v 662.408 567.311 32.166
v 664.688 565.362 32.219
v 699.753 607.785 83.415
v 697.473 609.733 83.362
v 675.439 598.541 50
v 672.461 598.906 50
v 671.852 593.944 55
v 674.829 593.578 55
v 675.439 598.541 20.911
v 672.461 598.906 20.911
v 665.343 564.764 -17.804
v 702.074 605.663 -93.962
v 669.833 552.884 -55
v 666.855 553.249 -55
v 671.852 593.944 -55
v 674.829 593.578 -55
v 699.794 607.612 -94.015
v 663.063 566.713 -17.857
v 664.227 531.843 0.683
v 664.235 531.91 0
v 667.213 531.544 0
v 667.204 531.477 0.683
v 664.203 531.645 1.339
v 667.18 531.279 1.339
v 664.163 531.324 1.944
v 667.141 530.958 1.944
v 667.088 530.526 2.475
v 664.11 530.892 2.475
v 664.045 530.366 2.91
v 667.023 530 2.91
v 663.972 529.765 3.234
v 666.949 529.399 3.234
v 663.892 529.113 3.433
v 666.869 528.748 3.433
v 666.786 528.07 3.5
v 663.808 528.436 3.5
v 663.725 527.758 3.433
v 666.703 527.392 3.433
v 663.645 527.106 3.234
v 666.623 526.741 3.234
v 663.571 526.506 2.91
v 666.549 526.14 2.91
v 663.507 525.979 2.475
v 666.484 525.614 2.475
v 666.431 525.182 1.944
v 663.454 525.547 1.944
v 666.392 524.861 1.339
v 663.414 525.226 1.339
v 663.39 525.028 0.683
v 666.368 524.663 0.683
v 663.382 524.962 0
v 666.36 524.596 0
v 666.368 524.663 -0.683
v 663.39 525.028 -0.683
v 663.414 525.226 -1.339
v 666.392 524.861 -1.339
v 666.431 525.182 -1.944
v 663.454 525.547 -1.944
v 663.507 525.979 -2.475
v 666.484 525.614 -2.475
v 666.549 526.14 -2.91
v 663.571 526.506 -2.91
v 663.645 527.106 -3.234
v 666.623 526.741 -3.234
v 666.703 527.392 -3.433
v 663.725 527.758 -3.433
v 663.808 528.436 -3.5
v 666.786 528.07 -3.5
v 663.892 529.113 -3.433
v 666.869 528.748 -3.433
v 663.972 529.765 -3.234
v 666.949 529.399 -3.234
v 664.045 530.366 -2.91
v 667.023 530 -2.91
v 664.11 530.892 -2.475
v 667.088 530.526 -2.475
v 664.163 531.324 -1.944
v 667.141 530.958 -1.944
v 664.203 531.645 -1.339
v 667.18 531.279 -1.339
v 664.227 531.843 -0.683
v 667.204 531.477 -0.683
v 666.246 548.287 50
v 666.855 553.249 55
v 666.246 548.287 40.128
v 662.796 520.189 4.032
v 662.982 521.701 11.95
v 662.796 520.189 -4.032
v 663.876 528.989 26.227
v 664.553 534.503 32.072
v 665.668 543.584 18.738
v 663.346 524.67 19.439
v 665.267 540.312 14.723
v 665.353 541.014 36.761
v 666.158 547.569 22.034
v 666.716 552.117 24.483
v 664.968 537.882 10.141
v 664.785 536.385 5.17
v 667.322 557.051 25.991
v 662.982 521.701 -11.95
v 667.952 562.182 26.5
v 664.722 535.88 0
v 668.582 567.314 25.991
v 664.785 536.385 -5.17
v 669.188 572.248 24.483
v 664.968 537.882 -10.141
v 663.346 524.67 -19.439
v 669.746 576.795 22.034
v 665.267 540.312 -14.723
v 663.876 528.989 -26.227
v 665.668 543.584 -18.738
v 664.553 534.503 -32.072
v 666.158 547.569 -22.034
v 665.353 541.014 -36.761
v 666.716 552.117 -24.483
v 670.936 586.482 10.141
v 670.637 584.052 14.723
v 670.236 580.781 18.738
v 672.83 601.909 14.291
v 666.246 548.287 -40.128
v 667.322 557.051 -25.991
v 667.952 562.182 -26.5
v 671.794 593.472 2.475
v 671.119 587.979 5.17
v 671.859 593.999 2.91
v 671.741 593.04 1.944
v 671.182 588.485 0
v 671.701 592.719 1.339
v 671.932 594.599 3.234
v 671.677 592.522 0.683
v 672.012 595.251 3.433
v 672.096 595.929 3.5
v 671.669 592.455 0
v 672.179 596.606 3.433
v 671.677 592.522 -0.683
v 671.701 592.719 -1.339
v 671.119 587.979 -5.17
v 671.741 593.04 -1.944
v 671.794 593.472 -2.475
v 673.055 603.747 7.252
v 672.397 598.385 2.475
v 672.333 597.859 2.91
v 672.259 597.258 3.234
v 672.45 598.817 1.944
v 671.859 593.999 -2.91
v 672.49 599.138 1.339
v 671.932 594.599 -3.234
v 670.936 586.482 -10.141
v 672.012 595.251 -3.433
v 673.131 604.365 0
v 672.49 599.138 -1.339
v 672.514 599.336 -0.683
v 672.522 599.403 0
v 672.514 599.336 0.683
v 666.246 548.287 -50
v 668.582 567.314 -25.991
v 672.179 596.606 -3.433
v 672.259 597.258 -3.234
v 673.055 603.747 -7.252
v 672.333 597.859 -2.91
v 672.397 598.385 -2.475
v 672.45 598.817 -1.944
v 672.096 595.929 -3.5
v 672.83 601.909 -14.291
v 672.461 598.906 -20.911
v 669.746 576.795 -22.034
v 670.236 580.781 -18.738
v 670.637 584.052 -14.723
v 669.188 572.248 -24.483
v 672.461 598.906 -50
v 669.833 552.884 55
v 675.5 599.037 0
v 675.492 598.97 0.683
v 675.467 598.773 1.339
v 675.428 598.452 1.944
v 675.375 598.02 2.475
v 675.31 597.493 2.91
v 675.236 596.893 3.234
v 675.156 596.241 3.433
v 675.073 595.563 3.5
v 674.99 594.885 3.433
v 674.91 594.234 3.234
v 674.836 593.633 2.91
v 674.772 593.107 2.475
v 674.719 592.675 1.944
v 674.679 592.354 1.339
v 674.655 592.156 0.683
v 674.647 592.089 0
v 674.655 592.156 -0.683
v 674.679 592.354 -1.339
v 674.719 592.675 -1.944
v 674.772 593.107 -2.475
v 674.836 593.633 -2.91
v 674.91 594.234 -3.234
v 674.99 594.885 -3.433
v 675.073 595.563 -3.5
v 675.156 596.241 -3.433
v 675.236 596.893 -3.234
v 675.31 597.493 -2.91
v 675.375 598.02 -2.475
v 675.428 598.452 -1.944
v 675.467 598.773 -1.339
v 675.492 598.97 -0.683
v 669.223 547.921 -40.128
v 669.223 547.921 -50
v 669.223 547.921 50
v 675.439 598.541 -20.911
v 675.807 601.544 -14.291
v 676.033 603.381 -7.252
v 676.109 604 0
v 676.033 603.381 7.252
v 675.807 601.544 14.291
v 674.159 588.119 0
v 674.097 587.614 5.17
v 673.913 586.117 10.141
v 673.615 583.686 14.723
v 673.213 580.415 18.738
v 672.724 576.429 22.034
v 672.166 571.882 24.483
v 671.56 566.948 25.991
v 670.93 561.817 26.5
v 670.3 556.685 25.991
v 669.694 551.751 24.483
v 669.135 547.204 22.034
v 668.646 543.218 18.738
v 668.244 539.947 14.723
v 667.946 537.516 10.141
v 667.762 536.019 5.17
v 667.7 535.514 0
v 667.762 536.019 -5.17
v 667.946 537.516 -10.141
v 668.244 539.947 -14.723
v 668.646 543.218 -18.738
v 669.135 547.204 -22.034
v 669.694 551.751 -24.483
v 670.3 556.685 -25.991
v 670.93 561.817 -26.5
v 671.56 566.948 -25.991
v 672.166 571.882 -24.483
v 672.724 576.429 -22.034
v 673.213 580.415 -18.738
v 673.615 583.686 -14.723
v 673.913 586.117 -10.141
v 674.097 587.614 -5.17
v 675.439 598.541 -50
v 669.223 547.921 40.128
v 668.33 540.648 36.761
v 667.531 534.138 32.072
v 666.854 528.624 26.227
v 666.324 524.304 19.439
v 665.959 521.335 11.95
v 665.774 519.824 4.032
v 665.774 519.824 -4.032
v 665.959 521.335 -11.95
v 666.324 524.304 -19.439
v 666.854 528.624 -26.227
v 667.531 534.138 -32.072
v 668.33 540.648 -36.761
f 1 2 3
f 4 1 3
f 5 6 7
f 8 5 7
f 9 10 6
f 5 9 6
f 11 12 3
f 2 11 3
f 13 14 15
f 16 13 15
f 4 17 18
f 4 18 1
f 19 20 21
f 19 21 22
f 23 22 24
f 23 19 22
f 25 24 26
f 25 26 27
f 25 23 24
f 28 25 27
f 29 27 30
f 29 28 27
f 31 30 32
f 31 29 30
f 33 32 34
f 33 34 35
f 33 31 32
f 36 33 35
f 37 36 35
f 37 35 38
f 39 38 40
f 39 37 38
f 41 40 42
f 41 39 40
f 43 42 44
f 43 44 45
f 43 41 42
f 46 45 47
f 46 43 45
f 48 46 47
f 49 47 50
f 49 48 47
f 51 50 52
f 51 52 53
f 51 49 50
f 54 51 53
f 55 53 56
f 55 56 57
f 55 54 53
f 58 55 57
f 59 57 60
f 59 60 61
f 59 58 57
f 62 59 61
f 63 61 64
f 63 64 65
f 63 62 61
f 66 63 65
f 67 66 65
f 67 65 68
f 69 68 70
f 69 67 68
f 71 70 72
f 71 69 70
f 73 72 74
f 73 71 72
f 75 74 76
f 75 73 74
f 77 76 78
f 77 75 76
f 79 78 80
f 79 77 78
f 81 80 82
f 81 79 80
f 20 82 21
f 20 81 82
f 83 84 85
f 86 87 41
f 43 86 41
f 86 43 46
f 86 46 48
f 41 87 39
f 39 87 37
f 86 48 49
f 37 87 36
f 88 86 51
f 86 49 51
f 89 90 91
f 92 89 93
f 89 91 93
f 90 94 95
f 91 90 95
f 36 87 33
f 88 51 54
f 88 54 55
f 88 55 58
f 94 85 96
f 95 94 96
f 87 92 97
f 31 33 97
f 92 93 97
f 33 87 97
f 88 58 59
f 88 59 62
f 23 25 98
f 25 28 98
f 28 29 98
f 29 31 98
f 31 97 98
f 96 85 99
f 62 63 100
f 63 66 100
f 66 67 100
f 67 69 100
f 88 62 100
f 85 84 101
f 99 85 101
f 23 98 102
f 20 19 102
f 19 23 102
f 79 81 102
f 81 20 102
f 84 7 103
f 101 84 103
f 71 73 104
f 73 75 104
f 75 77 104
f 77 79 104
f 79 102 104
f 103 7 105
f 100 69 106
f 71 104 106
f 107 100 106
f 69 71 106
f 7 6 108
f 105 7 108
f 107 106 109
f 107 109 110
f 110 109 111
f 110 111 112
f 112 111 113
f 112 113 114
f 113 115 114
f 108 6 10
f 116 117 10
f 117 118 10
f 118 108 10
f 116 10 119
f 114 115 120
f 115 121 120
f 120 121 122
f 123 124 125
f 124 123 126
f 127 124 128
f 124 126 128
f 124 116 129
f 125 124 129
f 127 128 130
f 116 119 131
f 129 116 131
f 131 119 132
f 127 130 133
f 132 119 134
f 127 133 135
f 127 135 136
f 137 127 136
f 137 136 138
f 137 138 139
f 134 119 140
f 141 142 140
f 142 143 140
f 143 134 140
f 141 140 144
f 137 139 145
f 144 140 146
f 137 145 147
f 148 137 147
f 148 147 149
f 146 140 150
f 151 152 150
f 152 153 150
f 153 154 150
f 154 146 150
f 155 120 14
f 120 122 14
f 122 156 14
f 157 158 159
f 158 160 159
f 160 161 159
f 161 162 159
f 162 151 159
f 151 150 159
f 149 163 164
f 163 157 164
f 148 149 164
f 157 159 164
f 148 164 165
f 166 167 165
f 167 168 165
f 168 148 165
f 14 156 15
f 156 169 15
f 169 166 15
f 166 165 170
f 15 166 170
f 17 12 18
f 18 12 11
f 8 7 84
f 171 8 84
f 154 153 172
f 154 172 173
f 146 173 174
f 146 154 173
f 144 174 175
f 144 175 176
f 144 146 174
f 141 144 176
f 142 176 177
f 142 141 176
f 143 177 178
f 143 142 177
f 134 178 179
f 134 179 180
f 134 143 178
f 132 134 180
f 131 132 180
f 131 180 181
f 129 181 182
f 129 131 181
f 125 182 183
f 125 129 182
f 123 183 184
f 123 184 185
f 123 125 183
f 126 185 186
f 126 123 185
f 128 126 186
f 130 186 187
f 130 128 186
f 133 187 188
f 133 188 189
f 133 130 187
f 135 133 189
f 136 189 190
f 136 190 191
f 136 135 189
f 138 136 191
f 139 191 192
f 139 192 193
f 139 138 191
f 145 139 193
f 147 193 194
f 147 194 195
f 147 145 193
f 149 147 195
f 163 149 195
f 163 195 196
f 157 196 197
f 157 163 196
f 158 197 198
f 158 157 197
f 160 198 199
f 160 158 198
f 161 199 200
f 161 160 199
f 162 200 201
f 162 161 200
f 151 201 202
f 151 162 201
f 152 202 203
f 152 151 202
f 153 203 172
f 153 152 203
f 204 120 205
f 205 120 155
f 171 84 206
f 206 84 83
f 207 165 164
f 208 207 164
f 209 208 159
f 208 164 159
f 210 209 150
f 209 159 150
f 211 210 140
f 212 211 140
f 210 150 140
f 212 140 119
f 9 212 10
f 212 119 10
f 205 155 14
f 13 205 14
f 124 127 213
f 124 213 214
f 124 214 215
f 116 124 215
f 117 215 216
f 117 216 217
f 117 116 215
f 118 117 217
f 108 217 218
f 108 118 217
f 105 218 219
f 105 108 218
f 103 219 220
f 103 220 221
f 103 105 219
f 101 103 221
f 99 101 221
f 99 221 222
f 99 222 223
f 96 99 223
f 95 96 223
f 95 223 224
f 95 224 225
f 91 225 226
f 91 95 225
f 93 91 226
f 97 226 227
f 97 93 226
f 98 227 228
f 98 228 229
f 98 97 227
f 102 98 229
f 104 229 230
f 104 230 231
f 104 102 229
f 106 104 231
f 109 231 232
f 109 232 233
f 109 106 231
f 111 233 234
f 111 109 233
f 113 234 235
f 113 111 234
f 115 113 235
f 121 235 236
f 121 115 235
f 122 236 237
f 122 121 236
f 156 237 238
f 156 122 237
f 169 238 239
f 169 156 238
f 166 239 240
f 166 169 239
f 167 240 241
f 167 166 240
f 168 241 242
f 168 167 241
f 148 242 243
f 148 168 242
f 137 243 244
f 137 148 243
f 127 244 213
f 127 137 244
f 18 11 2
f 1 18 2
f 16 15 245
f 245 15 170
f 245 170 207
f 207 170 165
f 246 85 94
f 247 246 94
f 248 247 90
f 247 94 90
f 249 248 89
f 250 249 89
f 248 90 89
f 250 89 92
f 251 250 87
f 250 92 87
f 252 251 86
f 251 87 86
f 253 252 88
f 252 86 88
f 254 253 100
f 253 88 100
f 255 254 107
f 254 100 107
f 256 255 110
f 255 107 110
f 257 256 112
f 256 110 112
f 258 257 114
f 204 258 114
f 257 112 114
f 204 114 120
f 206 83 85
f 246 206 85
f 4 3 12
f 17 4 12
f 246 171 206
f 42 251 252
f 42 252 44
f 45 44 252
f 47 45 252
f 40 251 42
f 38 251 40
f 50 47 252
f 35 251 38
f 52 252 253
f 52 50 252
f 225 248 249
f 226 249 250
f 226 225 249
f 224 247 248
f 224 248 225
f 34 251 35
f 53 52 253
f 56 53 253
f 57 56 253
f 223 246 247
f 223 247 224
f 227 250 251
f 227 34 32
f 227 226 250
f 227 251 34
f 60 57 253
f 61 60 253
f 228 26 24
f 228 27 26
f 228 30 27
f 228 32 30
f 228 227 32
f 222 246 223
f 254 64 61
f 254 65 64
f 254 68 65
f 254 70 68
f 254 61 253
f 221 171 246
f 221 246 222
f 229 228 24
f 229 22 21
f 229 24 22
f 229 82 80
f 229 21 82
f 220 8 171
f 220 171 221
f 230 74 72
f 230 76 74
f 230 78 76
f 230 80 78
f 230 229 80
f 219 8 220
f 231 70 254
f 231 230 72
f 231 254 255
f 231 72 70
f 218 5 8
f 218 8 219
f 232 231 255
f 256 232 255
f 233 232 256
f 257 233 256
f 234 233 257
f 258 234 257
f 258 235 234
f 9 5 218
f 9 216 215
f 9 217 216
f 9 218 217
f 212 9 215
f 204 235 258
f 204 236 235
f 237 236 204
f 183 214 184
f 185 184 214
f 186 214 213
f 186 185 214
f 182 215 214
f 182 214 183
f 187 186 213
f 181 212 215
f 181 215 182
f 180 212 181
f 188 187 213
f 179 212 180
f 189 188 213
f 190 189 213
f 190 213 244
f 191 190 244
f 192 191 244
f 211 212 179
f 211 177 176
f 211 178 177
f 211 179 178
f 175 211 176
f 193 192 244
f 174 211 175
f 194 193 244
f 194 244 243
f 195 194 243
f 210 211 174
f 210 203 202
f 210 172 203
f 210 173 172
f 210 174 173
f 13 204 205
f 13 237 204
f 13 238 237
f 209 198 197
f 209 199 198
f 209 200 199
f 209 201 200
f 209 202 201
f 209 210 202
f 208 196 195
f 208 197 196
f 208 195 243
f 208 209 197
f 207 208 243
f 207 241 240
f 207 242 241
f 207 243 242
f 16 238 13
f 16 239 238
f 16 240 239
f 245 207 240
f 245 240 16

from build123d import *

# Parameters (mm, degrees)
BOSS_EXTRUDE1_START = -15.9
BOSS_EXTRUDE1_DEPTH = 3
SKETCH3_R           = 3.5
SKETCH3_R_2         = 26.5
BOSS_EXTRUDE2_DEPTH = 3


with BuildPart() as part:
    # Sketch2 → Boss-Extrude1 (new body)
    with BuildSketch(Plane(origin=(117.356768786, -100.303676541, 2.735224282), x_dir=(0.013083184034836956, -0.011957631507149957, -0.9998429103335432), z_dir=(0.7600578289260114, -0.6496139542146466, 0.017714603520517413)).offset(BOSS_EXTRUDE1_START)):
        Polygon((-30.278336534, 861.616572504), (-81.514394736, 916.616572504), (95.889916348, 916.616572504), (19.752599346, 861.616572504), align=None)
    extrude(amount=-BOSS_EXTRUDE1_DEPTH)


with BuildPart() as body_2:
    # Sketch3 → Boss-Extrude2 (new body)
    with BuildSketch(Plane(origin=(590.029393702, -72.446500026, 0), x_dir=(0, 0, -1), z_dir=(0.992546151641322, -0.12186934340514777, 0))):
        with BuildLine():
            Line((40.127920454, 625.394614031), (49.999999876, 625.394613247))
            Line((49.999999876, 625.394613247), (54.999999876, 630.394613247))
            Line((54.999999876, 630.394613247), (54.999999876, 671.394613247))
            Line((54.999999876, 671.394613247), (49.999999876, 676.394613247))
            Line((49.999999876, 676.394613247), (20.910523666, 676.394613247))
            ThreePointArc((20.910523666, 676.394613247), (0, 681.894613247), (-20.910523666, 676.394613247))
            Line((-20.910523666, 676.394613247), (-50, 676.394613247))
            Line((-50, 676.394613247), (-55, 671.394613247))
            Line((-55, 671.394613247), (-55, 630.394613247))
            Line((-55, 630.394613247), (-50, 625.394613247))
            Line((-50, 625.394613247), (-40.127920454, 625.394614031))
            ThreePointArc((-40.127920454, 625.394614031), (0, 596.894614031), (40.127920454, 625.394614031))
        make_face()
        with Locations(Location((0, 605.394615096, 0), (0, 0, 90))):
            Circle(SKETCH3_R, mode=Mode.SUBTRACT)
        with Locations(Location((0, 673.394612265, 0), (0, 0, 90))):
            Circle(SKETCH3_R, mode=Mode.SUBTRACT)
        with Locations(Location((0, 639.394613247, 0), (0, 0, 90))):
            Circle(SKETCH3_R_2, mode=Mode.SUBTRACT)
    extrude(amount=BOSS_EXTRUDE2_DEPTH)


solid = Compound([part.part, body_2.part])
